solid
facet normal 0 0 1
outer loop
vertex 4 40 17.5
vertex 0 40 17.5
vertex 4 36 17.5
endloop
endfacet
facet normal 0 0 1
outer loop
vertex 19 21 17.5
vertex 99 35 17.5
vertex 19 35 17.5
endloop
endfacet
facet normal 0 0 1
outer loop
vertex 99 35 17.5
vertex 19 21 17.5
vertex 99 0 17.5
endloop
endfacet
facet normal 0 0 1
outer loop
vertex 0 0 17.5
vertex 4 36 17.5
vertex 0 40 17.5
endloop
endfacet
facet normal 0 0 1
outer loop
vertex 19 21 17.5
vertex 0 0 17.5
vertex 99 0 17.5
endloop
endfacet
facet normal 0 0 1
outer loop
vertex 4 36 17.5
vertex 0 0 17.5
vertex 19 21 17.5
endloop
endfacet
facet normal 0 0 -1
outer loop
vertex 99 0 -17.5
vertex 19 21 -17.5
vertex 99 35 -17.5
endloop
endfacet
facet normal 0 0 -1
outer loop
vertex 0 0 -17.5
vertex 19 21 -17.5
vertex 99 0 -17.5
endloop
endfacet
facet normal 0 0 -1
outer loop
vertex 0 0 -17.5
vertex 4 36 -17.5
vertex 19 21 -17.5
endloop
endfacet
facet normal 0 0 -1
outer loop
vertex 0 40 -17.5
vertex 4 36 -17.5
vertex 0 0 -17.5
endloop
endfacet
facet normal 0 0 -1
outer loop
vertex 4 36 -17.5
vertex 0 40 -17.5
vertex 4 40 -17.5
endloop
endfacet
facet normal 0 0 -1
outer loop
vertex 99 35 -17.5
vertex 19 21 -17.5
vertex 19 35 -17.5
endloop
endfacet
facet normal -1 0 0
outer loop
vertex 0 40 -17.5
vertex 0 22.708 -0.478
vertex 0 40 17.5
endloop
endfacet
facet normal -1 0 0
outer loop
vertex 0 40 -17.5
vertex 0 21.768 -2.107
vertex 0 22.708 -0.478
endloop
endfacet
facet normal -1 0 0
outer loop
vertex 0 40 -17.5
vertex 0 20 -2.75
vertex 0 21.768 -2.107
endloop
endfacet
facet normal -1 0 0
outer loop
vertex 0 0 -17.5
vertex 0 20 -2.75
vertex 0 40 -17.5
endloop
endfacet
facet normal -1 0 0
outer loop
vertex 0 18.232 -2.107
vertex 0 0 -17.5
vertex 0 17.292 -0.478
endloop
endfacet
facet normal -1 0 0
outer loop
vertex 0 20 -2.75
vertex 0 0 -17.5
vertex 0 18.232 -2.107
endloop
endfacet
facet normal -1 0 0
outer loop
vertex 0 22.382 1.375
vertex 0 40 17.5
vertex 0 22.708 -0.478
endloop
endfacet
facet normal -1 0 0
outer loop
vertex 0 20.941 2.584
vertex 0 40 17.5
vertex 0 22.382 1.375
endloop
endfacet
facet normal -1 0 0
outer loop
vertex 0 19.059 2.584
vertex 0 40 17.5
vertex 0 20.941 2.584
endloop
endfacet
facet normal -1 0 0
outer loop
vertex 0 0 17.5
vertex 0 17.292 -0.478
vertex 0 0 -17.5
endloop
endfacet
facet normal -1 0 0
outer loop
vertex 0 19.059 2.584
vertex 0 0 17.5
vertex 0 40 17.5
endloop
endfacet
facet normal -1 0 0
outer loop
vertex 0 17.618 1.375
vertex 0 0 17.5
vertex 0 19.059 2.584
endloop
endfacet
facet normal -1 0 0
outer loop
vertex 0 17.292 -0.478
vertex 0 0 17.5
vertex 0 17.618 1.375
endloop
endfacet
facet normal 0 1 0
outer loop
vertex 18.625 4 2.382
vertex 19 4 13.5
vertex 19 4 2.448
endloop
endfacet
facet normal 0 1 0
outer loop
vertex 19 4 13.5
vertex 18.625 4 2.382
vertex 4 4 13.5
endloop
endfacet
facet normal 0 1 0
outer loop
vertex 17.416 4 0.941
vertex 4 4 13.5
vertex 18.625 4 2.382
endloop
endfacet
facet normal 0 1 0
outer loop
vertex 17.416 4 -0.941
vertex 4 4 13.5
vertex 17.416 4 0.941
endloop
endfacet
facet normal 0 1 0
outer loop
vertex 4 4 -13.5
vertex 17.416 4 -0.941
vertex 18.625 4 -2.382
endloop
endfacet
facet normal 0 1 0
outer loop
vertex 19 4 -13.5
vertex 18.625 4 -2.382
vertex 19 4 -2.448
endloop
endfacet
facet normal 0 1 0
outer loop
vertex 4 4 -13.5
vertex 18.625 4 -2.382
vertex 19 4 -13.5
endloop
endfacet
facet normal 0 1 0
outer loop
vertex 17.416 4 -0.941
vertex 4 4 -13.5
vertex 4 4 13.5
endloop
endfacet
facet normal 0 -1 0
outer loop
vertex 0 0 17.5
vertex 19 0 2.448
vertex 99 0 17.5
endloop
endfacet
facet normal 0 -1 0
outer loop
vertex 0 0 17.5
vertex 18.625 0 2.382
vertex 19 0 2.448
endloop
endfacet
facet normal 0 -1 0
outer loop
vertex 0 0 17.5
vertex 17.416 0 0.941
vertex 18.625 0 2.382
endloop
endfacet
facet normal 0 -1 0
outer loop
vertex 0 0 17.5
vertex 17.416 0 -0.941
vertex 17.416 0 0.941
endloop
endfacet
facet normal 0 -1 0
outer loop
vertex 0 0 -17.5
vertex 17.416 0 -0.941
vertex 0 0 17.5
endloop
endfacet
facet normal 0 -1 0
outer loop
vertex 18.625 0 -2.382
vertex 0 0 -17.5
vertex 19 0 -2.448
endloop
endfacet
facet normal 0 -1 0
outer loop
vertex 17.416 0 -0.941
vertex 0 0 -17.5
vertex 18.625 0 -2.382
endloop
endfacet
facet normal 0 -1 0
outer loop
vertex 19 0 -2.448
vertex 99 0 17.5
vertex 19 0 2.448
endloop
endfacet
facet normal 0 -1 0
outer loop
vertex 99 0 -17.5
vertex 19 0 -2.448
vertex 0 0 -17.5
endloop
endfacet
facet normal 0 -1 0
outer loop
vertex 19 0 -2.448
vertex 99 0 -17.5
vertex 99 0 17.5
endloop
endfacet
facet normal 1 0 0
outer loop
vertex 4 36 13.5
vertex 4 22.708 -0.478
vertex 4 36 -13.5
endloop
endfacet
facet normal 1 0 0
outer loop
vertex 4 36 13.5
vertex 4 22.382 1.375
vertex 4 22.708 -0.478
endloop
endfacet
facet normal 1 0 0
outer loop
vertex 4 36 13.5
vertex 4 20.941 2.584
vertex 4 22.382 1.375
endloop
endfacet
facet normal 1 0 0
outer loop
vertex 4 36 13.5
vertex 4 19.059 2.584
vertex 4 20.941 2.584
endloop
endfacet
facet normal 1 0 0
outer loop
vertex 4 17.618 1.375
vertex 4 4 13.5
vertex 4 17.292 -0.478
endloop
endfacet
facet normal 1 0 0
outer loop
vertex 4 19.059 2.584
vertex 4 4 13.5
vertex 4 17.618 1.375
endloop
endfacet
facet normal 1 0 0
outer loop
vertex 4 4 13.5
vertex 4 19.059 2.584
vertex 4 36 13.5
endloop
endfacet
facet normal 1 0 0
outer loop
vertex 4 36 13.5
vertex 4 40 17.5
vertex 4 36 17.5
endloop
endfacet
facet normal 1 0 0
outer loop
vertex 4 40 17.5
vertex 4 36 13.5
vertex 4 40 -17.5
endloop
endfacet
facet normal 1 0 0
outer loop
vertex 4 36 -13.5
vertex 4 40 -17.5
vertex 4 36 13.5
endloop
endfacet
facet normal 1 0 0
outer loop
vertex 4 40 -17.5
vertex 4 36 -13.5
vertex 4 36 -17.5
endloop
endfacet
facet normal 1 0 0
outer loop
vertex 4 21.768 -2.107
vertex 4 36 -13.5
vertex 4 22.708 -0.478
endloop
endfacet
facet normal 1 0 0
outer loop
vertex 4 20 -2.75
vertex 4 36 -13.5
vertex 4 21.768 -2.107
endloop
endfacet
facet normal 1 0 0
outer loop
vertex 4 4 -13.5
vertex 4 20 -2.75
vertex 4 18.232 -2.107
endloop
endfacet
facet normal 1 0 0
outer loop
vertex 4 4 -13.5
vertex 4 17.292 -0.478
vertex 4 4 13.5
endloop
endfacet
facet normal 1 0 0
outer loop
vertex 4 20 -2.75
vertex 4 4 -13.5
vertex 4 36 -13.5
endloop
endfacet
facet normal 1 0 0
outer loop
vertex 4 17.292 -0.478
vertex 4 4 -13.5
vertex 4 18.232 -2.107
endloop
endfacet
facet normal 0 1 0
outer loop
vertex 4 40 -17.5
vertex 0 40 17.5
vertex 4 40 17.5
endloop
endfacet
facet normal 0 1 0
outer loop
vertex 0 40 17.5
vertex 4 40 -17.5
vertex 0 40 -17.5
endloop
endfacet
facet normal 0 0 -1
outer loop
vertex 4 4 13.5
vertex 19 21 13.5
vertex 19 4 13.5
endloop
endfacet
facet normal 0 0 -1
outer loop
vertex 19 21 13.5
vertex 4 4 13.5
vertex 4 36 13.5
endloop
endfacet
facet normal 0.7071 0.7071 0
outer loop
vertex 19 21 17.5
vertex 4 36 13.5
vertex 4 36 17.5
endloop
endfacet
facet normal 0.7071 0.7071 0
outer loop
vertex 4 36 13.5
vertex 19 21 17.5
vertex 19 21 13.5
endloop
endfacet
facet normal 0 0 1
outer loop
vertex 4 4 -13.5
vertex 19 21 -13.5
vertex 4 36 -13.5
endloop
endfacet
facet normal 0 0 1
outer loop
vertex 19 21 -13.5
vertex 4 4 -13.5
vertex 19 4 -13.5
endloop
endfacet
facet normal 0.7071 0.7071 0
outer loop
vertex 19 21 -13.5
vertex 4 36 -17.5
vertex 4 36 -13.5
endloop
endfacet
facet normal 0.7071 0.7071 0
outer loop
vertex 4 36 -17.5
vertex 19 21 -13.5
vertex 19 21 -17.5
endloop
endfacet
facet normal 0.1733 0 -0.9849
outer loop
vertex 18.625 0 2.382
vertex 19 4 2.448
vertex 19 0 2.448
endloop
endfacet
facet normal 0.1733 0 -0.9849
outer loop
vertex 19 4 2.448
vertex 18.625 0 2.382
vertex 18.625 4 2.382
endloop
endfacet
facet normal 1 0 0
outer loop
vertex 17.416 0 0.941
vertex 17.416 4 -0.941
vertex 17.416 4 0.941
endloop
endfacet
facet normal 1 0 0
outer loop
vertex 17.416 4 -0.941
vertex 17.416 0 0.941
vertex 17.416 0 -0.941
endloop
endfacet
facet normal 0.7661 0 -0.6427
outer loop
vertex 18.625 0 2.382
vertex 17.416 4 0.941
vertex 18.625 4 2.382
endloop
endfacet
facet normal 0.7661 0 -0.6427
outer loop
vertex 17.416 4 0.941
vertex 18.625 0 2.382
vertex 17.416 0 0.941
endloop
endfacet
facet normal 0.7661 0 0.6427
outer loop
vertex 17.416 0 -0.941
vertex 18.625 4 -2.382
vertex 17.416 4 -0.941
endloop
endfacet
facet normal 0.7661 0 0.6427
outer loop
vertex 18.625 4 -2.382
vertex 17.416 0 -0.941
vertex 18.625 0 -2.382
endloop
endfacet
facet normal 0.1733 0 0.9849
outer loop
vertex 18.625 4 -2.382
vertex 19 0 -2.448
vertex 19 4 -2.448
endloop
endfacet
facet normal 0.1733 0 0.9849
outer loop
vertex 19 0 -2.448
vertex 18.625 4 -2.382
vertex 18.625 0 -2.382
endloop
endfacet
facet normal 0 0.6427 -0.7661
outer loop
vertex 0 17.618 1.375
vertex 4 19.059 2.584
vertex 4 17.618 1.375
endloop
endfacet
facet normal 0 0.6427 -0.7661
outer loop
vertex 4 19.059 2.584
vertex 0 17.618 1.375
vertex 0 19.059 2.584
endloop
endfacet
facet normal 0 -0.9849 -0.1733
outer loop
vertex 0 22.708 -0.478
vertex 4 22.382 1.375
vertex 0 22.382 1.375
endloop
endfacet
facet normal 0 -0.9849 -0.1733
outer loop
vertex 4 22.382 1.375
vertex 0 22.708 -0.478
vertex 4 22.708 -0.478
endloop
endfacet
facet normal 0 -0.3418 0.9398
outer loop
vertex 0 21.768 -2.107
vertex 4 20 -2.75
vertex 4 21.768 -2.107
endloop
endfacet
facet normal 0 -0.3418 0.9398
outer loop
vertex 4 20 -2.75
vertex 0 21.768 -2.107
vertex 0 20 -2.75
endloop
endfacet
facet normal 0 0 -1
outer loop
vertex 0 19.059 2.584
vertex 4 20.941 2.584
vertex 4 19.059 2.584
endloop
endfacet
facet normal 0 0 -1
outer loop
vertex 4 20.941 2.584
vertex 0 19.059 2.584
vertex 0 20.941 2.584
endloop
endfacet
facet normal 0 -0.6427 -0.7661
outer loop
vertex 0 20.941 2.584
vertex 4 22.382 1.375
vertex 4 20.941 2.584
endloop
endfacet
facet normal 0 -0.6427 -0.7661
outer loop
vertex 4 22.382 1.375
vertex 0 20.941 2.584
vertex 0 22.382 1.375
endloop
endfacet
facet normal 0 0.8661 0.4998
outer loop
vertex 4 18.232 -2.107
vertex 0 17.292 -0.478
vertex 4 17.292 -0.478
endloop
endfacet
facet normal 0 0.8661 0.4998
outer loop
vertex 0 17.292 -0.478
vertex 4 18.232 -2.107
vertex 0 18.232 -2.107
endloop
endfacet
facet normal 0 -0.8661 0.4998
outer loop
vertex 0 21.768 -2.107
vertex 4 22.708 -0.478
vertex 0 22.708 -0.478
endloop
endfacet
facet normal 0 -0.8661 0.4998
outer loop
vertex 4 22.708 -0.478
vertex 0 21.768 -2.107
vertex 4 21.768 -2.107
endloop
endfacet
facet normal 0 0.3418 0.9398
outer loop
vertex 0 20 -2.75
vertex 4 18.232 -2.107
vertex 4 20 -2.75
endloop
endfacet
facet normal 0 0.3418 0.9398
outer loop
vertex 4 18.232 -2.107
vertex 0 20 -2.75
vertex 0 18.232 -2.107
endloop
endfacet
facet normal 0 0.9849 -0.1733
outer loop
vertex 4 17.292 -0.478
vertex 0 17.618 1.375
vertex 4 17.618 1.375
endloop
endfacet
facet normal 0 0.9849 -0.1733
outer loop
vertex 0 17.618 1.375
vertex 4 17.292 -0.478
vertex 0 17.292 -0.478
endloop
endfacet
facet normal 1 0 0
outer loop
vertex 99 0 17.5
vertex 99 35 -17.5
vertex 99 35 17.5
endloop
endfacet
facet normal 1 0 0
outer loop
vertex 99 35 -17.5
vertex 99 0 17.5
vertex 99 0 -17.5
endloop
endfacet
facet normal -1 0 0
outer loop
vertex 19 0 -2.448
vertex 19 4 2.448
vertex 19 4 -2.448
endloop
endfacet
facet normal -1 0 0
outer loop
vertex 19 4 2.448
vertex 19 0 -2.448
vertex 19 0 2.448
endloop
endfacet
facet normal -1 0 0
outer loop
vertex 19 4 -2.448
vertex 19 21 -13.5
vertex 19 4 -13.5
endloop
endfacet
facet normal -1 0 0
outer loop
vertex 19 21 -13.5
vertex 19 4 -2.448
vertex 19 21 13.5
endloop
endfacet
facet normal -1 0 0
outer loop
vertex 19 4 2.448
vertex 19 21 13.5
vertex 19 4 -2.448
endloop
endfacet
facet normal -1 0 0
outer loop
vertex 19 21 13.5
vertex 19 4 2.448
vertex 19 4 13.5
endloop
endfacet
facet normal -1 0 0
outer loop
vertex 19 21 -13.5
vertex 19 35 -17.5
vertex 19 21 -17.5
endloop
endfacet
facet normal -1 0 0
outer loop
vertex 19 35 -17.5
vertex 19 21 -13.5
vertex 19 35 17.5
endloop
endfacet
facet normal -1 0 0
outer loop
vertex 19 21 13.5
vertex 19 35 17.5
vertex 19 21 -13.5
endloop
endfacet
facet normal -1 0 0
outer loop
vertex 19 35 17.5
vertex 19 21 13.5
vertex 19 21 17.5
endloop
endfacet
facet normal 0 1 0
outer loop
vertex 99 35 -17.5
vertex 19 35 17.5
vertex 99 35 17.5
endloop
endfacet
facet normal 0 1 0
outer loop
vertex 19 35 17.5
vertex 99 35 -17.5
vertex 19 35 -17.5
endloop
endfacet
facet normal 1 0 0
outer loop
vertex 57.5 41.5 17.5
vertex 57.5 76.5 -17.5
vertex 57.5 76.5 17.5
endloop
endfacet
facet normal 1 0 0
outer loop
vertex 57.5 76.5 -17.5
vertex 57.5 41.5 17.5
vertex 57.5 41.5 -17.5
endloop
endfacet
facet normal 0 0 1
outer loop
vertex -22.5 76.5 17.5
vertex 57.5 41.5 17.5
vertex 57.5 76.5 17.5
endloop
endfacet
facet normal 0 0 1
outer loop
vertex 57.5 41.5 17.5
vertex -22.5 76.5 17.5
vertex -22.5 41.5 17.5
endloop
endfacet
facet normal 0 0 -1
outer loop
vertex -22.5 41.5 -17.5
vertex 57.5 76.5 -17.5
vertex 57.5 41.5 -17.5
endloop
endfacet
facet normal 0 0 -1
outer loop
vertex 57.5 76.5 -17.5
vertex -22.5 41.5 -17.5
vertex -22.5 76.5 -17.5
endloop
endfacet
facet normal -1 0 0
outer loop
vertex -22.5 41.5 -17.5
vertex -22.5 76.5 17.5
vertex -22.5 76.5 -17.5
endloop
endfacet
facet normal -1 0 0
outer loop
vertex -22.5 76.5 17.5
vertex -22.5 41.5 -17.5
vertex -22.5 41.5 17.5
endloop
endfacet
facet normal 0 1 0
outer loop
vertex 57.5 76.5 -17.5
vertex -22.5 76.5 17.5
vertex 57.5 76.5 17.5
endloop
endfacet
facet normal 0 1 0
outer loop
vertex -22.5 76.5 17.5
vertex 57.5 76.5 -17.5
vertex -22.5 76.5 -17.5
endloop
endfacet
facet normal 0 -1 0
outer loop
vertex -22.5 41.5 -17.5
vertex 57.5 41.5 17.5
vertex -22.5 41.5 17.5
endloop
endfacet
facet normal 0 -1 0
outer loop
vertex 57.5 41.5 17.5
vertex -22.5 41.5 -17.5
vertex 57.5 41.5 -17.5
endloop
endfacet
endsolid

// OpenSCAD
// Parameters
overall_x = 40; //[20:80:1]
overall_y = 40; //[20:80:1]
overall_z = 35; //[18:70:1]
base_plate_thickness = 4; //[2:8:1]
side_wall_thickness = 4; //[2:8:1]
gusset_thickness = 4; //[2:10:1]
hole_count = 2; //[2:4:1]
hole_diameter = 5.5; //[3:8:0.1]
hole_offset_from_inner_corner = 20; //[10:35:1]
extrusion_interface = 35; //[18:60:1]
extrusion_length = 80; //[40:200:1]
overlap = 1; //[0.5:2:0.1]

// Extrusion - complete geometry
module extrusion() {
  color([0.85, 0.85, 0.8]) {
    cube([extrusion_length, extrusion_interface, extrusion_interface], center=true);
  }
}

// Extrusion Corner Bracket Hole Positions - complete geometry
module extrusion_corner_bracket_hole_positions() {
  color("Silver") {
    translate([hole_offset_from_inner_corner, base_plate_thickness/2, 0])
      rotate([90, 0, 0])
      cylinder(r=hole_diameter/2, h=base_plate_thickness + 2*overlap, center=true);
    translate([base_plate_thickness/2, hole_offset_from_inner_corner, 0])
      rotate([0, 90, 0])
      cylinder(r=hole_diameter/2, h=base_plate_thickness + 2*overlap, center=true);
  }
}

// Extrusion Corner Bracket - complete geometry
module extrusion_corner_bracket() {
  color("DimGray") {
    union() {
      translate([overall_x/2, base_plate_thickness/2, 0])
        cube([overall_x, base_plate_thickness, overall_z], center=true);
      translate([base_plate_thickness/2, overall_y/2, 0])
        cube([base_plate_thickness, overall_y, overall_z], center=true);
      translate([0, 0, overall_z/2 - gusset_thickness/2])
        linear_extrude(height=gusset_thickness, center=true)
        polygon(points=[[0, 0], [overall_x, 0], [0, overall_y]]);
      translate([0, 0, -overall_z/2 + gusset_thickness/2])
        linear_extrude(height=gusset_thickness, center=true)
        polygon(points=[[0, 0], [overall_x, 0], [0, overall_y]]);
    }
  }
}

// Extrusion Corner Bracket 3D - complete geometry
module extrusion_corner_bracket_3D() {
  difference() {
    extrusion_corner_bracket();
    extrusion_corner_bracket_hole_positions();
  }
}

// Extrusion Corner Bracket Assembly - complete geometry
module extrusion_corner_bracket_assembly() {
  union() {
    extrusion_corner_bracket_3D();
    translate([overall_x/2 + extrusion_length/2 - overlap, extrusion_interface/2, 0])
      extrusion();
    translate([extrusion_interface/2, overall_y/2 + extrusion_length/2 - overlap, 0])
      extrusion();
  }
}

// Assembly
module assembly() {
  extrusion_corner_bracket_assembly();
}

assembly();
